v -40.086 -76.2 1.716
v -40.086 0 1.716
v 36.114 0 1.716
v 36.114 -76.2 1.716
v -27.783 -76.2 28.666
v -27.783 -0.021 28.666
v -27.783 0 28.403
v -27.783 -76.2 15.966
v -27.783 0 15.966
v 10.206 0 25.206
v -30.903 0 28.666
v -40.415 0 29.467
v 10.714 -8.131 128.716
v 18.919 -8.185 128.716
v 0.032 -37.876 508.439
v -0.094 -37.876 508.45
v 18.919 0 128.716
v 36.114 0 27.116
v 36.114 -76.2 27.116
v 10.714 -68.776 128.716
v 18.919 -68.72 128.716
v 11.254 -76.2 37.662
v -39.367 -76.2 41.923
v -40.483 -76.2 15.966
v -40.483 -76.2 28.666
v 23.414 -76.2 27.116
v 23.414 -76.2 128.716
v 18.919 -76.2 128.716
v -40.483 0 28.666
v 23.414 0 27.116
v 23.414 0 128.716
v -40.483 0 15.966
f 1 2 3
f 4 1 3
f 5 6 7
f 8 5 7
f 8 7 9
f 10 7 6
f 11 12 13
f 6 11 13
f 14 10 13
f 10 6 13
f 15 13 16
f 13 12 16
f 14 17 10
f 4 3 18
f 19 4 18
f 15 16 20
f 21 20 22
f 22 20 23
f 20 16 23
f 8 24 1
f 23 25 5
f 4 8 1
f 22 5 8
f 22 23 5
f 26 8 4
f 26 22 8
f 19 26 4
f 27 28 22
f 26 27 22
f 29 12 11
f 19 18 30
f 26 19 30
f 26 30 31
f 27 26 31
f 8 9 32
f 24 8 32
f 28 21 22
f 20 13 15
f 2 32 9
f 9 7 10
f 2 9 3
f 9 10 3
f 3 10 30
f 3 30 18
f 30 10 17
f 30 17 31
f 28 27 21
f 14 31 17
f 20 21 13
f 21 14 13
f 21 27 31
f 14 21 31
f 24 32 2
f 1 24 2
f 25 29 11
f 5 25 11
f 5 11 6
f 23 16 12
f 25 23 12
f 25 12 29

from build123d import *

# Parameters (mm, degrees)
F1_DEPTH = 76.2
F4_DEPTH = 25.4
F6_DEPTH = 25.4
F7_DEPTH = 25.4
F8_DEPTH = 25.4


with BuildPart() as f1:
    # F0 (on Front) → F1 (new body)
    with BuildSketch(Plane.XZ):
        Polygon((-40.0857904882, 1.7159489595), (36.1142095118, 1.7159489595), (36.1142095118, 27.1159489595), (23.4142095118, 27.1159489595), (23.4142095118, 128.7159489595), (10.7142095118, 128.7159489595), (0, 509.5652704956), (-40.4825732112, 28.6661945283), (-27.7825732112, 28.6661945283), (-27.7825732112, 15.9661945283), (-40.4825732112, 15.9661945283), align=None)
    extrude(amount=F1_DEPTH)

    # F3 (on face) → F4 (cut)
    with BuildSketch(Plane(origin=(-42.5938834628, 0, 3.585596421), x_dir=(0, -1, 0), z_dir=(-0.9964754993, 0, 0.0838843208))):
        Polygon((37.7841320195, 507.7693073485), (76.2, 38.4734290846), (76.2, 507.7693073485), align=None)
    extrude(amount=-F4_DEPTH, mode=Mode.SUBTRACT)

    # F5 (on face) → F6 (cut)
    with BuildSketch(Plane(origin=(-42.5938834628, 0, 3.585596421), x_dir=(0, -1, 0), z_dir=(-0.9964754993, 0, 0.0838843208))):
        Polygon((0, 25.9728506207), (37.9639834193, 507.7693073485), (0, 507.7693073485), align=None)
    extrude(amount=-F6_DEPTH, mode=Mode.SUBTRACT)

    # F7 (cut): a face of the model
    f7_faces = [f1.faces().sort_by_distance(p)[0] for p in [
        (-0.4288778428, -69.5509425431, 201.6726152219),
    ]]
    extrude(f7_faces, amount=-F7_DEPTH, mode=Mode.SUBTRACT)

    # F8 (cut): a face of the model
    f8_faces = [f1.faces().sort_by_distance(p)[0] for p in [
        (-0.7784120208, -6.7286940969, 197.5204418331),
    ]]
    extrude(f8_faces, amount=-F8_DEPTH, mode=Mode.SUBTRACT)


solid = f1.part
